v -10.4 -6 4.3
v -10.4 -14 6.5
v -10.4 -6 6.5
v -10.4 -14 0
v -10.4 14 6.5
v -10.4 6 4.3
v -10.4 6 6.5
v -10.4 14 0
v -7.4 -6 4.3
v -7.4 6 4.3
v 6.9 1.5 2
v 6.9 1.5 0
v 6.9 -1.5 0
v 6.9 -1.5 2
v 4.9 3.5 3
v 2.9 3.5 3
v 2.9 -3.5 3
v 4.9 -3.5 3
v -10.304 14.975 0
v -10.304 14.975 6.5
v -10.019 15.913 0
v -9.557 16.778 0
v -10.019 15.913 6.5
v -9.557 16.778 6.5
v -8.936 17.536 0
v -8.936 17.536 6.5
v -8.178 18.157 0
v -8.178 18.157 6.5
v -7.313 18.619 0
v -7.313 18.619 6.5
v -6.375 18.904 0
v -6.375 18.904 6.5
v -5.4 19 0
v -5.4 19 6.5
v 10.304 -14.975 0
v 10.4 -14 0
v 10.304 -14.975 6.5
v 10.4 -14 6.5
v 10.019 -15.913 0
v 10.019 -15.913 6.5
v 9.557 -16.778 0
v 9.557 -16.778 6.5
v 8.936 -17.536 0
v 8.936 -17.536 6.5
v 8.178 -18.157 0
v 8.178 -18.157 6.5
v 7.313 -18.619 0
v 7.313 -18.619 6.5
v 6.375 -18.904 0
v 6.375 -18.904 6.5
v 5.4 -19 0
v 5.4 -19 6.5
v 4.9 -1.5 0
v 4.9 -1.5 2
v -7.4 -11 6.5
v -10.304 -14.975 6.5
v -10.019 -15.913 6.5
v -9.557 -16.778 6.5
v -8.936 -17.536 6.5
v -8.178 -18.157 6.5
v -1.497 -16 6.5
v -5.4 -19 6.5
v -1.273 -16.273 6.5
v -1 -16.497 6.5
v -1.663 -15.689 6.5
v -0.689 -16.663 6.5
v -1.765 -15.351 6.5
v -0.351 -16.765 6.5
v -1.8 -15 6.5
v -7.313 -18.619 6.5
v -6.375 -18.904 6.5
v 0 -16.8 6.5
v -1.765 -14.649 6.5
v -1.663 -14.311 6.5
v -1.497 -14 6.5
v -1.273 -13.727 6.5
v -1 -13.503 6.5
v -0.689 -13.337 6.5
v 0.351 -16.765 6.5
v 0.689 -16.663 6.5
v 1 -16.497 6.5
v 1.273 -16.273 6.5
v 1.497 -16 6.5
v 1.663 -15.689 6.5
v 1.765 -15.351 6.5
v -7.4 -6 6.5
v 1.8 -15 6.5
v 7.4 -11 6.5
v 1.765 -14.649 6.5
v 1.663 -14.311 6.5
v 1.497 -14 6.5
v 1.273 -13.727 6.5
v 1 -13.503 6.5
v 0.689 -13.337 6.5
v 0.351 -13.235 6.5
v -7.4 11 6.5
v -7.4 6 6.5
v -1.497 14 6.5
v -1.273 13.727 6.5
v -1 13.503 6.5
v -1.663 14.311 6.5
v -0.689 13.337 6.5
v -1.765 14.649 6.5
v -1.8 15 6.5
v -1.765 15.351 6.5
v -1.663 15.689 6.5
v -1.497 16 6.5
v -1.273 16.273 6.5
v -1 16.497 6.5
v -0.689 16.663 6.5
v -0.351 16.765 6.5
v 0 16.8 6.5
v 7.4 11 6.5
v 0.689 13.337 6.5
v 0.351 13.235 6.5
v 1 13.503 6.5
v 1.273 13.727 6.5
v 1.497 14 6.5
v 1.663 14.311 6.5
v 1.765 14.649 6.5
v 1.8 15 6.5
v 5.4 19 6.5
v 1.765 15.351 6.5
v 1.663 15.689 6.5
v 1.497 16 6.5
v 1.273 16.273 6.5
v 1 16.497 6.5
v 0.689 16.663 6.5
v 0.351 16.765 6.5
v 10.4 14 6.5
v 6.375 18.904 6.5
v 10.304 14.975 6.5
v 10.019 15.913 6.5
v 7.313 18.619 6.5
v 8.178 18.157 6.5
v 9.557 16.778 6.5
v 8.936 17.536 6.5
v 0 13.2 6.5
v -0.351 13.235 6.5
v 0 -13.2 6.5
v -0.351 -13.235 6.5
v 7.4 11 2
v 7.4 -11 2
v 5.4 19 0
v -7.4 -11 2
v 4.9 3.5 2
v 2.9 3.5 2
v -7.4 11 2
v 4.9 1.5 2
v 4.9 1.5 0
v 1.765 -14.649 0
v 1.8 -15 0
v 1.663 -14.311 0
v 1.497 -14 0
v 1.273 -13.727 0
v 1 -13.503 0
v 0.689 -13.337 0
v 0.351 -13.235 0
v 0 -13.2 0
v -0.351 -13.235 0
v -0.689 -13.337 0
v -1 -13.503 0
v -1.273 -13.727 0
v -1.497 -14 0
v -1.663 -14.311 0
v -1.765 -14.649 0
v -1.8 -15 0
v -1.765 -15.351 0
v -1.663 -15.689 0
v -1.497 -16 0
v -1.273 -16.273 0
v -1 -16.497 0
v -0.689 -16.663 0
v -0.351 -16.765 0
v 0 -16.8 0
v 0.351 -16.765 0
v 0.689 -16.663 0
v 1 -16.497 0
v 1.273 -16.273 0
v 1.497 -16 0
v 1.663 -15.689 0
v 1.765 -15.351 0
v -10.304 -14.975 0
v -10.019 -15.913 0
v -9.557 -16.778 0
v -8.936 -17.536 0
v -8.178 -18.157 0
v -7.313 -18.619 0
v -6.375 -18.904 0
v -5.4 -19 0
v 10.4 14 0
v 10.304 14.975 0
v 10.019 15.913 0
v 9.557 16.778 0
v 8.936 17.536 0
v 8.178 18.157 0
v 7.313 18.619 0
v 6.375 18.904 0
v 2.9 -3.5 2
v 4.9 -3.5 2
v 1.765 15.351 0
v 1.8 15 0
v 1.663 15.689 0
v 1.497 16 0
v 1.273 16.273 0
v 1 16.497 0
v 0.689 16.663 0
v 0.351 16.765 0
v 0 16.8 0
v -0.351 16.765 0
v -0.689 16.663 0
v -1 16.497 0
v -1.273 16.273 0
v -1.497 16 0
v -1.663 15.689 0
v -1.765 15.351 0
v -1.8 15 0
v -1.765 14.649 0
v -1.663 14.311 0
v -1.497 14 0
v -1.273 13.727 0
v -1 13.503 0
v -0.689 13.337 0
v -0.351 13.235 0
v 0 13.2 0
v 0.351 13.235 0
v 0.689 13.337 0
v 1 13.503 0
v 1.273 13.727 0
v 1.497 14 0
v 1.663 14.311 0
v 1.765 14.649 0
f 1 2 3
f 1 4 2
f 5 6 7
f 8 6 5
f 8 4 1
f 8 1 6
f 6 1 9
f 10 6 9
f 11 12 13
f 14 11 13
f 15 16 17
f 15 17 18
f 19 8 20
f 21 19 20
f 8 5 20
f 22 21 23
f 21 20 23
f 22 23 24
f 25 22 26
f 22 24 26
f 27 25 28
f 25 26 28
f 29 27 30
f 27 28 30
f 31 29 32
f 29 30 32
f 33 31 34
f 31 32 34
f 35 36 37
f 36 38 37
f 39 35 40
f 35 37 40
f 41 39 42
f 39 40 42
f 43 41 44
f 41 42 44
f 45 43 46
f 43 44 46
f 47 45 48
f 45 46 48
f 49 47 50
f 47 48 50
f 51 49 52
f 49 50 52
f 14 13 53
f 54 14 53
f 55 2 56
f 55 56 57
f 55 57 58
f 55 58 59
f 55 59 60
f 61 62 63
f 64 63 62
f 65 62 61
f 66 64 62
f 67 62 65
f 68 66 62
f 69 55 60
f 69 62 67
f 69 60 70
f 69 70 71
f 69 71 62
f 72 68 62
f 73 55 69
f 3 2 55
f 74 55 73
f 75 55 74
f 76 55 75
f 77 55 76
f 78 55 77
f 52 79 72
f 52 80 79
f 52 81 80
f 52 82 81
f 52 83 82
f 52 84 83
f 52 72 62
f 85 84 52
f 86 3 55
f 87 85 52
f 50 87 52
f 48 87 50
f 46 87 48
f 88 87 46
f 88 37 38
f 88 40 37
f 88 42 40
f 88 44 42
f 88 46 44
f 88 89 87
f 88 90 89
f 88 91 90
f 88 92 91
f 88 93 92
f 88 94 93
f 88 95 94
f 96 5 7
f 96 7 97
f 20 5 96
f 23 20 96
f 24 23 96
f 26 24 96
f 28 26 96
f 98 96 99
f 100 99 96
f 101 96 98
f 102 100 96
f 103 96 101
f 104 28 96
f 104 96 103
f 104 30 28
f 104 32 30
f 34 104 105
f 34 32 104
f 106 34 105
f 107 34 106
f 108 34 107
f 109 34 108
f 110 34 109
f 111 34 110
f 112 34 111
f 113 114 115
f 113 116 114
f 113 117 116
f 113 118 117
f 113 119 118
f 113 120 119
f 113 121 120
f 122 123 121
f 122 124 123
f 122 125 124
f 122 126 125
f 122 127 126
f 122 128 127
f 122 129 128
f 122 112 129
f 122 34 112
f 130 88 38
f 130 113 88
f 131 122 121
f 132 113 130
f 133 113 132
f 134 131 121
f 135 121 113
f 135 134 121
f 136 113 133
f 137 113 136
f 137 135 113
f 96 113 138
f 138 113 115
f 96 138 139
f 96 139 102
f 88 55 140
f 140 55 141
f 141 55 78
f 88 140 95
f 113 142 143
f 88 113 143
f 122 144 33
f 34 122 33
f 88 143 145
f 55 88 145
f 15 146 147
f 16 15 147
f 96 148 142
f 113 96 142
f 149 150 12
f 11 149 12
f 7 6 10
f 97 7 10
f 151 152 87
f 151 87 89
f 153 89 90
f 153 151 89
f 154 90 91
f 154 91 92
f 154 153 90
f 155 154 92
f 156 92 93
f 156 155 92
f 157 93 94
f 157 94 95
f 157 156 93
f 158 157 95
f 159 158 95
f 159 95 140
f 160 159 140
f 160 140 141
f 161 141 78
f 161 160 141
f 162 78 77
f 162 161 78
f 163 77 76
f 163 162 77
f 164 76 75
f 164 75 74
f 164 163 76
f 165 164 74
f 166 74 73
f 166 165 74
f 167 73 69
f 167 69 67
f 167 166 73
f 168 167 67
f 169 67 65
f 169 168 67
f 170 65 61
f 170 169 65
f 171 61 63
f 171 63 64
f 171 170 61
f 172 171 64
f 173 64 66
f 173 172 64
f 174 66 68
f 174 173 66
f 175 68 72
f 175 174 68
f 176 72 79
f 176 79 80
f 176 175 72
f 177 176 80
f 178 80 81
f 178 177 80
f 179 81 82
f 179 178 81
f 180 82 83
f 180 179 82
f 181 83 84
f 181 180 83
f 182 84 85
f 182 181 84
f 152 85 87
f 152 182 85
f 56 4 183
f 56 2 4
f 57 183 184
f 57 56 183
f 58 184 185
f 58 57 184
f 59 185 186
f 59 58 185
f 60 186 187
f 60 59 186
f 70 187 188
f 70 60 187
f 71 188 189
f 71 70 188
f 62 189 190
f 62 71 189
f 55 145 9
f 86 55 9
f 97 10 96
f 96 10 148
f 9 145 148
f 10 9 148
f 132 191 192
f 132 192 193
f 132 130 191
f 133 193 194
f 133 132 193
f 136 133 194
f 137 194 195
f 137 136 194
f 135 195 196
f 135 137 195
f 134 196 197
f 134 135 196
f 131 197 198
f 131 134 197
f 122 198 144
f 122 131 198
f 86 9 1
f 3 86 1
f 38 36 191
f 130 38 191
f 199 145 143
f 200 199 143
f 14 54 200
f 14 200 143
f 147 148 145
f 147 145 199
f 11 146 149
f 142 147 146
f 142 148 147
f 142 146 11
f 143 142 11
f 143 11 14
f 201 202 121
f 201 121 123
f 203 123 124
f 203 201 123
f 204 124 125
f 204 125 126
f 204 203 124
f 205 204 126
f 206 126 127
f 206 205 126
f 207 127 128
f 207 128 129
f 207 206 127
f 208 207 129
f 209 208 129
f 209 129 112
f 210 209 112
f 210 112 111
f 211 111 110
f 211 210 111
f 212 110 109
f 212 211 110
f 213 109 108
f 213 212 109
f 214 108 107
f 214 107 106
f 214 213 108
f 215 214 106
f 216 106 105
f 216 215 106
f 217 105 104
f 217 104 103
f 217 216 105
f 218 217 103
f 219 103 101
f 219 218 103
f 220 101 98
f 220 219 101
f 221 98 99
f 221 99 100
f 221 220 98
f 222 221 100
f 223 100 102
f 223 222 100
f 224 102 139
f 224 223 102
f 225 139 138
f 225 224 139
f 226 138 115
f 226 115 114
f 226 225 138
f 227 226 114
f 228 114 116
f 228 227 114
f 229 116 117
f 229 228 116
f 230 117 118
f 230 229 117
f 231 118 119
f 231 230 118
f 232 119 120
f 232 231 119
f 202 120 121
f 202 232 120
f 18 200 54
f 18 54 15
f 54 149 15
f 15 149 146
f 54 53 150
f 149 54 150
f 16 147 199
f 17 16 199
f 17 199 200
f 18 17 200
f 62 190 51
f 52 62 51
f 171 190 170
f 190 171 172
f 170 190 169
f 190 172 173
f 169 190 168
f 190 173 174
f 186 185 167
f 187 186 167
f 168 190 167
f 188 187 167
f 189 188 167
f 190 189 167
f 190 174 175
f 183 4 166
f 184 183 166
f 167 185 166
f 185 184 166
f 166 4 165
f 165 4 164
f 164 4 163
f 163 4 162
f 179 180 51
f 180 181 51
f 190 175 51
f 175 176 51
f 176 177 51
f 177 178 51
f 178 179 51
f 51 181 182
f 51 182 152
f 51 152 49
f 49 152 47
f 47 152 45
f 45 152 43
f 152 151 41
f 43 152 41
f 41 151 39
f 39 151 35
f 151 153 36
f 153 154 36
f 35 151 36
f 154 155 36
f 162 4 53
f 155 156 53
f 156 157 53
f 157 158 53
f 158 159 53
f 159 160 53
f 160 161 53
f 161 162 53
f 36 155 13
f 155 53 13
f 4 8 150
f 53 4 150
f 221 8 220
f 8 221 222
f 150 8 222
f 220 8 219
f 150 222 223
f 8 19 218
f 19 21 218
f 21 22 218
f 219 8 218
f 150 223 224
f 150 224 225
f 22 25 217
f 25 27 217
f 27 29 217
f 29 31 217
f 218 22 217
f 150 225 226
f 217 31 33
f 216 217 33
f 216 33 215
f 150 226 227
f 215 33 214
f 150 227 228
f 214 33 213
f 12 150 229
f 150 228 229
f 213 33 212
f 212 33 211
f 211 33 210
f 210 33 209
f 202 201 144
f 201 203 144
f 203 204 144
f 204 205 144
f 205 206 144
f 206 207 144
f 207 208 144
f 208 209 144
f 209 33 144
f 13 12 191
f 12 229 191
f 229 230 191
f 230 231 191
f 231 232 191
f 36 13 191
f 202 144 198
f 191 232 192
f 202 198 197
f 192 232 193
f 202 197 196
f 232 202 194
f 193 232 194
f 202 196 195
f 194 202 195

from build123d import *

# Parameters (mm, degrees)
F0_R     = 1.8
F1_DEPTH = 6.5
F2_DEPTH = 2
F3_DEPTH = 3
F0_W     = 3
F0_H     = 12
F4_DEPTH = 4.3
F5_R     = 5


with BuildPart() as f1:
    # F0 (on Top) → F1 (new body)
    with BuildSketch(Plane.XY):
        Polygon((-7.4, 6), (-7.4, 11), (7.4, 11), (7.4, -11), (-7.4, -11), (-7.4, -6), (-10.4, -6), (-10.4, -19), (10.4, -19), (10.4, 19), (-10.4, 19), (-10.4, 6), align=None)
        with Locations((0, -15)):
            Circle(F0_R, mode=Mode.SUBTRACT)
        with Locations((0, 15)):
            Circle(F0_R, mode=Mode.SUBTRACT)
    extrude(amount=F1_DEPTH)

    # F0 (on Top) → F2 (join)
    with BuildSketch(Plane.XY):
        Polygon((7.4, 11), (-7.4, 11), (-7.4, 6), (-7.4, -6), (-7.4, -11), (7.4, -11), align=None)
        Polygon((2.9, -3.5), (2.9, 3.5), (4.9, 3.5), (4.9, 1.5), (6.9, 1.5), (6.9, -1.5), (4.9, -1.5), (4.9, -3.5), align=None, mode=Mode.SUBTRACT)
    extrude(amount=F2_DEPTH)

    # F0 (on Top) → F3 (join)
    with BuildSketch(Plane.XY):
        Polygon((4.9, 3.5), (2.9, 3.5), (2.9, -3.5), (4.9, -3.5), (4.9, -1.5), (4.9, 1.5), align=None)
    extrude(amount=F3_DEPTH)

    # F0 (on Top) → F4 (join)
    with BuildSketch(Plane.XY):
        with Locations((-8.9, 0)):
            Rectangle(F0_W, F0_H)
    extrude(amount=F4_DEPTH)

    # F5
    f5_edges = [f1.edges().sort_by_distance(p)[0] for p in [
        (-10.4, 19, 3.25),
        (10.4, 19, 3.25),
        (-10.4, -19, 3.25),
        (10.4, -19, 3.25),
    ]]
    fillet(f5_edges, radius=F5_R)


solid = f1.part
